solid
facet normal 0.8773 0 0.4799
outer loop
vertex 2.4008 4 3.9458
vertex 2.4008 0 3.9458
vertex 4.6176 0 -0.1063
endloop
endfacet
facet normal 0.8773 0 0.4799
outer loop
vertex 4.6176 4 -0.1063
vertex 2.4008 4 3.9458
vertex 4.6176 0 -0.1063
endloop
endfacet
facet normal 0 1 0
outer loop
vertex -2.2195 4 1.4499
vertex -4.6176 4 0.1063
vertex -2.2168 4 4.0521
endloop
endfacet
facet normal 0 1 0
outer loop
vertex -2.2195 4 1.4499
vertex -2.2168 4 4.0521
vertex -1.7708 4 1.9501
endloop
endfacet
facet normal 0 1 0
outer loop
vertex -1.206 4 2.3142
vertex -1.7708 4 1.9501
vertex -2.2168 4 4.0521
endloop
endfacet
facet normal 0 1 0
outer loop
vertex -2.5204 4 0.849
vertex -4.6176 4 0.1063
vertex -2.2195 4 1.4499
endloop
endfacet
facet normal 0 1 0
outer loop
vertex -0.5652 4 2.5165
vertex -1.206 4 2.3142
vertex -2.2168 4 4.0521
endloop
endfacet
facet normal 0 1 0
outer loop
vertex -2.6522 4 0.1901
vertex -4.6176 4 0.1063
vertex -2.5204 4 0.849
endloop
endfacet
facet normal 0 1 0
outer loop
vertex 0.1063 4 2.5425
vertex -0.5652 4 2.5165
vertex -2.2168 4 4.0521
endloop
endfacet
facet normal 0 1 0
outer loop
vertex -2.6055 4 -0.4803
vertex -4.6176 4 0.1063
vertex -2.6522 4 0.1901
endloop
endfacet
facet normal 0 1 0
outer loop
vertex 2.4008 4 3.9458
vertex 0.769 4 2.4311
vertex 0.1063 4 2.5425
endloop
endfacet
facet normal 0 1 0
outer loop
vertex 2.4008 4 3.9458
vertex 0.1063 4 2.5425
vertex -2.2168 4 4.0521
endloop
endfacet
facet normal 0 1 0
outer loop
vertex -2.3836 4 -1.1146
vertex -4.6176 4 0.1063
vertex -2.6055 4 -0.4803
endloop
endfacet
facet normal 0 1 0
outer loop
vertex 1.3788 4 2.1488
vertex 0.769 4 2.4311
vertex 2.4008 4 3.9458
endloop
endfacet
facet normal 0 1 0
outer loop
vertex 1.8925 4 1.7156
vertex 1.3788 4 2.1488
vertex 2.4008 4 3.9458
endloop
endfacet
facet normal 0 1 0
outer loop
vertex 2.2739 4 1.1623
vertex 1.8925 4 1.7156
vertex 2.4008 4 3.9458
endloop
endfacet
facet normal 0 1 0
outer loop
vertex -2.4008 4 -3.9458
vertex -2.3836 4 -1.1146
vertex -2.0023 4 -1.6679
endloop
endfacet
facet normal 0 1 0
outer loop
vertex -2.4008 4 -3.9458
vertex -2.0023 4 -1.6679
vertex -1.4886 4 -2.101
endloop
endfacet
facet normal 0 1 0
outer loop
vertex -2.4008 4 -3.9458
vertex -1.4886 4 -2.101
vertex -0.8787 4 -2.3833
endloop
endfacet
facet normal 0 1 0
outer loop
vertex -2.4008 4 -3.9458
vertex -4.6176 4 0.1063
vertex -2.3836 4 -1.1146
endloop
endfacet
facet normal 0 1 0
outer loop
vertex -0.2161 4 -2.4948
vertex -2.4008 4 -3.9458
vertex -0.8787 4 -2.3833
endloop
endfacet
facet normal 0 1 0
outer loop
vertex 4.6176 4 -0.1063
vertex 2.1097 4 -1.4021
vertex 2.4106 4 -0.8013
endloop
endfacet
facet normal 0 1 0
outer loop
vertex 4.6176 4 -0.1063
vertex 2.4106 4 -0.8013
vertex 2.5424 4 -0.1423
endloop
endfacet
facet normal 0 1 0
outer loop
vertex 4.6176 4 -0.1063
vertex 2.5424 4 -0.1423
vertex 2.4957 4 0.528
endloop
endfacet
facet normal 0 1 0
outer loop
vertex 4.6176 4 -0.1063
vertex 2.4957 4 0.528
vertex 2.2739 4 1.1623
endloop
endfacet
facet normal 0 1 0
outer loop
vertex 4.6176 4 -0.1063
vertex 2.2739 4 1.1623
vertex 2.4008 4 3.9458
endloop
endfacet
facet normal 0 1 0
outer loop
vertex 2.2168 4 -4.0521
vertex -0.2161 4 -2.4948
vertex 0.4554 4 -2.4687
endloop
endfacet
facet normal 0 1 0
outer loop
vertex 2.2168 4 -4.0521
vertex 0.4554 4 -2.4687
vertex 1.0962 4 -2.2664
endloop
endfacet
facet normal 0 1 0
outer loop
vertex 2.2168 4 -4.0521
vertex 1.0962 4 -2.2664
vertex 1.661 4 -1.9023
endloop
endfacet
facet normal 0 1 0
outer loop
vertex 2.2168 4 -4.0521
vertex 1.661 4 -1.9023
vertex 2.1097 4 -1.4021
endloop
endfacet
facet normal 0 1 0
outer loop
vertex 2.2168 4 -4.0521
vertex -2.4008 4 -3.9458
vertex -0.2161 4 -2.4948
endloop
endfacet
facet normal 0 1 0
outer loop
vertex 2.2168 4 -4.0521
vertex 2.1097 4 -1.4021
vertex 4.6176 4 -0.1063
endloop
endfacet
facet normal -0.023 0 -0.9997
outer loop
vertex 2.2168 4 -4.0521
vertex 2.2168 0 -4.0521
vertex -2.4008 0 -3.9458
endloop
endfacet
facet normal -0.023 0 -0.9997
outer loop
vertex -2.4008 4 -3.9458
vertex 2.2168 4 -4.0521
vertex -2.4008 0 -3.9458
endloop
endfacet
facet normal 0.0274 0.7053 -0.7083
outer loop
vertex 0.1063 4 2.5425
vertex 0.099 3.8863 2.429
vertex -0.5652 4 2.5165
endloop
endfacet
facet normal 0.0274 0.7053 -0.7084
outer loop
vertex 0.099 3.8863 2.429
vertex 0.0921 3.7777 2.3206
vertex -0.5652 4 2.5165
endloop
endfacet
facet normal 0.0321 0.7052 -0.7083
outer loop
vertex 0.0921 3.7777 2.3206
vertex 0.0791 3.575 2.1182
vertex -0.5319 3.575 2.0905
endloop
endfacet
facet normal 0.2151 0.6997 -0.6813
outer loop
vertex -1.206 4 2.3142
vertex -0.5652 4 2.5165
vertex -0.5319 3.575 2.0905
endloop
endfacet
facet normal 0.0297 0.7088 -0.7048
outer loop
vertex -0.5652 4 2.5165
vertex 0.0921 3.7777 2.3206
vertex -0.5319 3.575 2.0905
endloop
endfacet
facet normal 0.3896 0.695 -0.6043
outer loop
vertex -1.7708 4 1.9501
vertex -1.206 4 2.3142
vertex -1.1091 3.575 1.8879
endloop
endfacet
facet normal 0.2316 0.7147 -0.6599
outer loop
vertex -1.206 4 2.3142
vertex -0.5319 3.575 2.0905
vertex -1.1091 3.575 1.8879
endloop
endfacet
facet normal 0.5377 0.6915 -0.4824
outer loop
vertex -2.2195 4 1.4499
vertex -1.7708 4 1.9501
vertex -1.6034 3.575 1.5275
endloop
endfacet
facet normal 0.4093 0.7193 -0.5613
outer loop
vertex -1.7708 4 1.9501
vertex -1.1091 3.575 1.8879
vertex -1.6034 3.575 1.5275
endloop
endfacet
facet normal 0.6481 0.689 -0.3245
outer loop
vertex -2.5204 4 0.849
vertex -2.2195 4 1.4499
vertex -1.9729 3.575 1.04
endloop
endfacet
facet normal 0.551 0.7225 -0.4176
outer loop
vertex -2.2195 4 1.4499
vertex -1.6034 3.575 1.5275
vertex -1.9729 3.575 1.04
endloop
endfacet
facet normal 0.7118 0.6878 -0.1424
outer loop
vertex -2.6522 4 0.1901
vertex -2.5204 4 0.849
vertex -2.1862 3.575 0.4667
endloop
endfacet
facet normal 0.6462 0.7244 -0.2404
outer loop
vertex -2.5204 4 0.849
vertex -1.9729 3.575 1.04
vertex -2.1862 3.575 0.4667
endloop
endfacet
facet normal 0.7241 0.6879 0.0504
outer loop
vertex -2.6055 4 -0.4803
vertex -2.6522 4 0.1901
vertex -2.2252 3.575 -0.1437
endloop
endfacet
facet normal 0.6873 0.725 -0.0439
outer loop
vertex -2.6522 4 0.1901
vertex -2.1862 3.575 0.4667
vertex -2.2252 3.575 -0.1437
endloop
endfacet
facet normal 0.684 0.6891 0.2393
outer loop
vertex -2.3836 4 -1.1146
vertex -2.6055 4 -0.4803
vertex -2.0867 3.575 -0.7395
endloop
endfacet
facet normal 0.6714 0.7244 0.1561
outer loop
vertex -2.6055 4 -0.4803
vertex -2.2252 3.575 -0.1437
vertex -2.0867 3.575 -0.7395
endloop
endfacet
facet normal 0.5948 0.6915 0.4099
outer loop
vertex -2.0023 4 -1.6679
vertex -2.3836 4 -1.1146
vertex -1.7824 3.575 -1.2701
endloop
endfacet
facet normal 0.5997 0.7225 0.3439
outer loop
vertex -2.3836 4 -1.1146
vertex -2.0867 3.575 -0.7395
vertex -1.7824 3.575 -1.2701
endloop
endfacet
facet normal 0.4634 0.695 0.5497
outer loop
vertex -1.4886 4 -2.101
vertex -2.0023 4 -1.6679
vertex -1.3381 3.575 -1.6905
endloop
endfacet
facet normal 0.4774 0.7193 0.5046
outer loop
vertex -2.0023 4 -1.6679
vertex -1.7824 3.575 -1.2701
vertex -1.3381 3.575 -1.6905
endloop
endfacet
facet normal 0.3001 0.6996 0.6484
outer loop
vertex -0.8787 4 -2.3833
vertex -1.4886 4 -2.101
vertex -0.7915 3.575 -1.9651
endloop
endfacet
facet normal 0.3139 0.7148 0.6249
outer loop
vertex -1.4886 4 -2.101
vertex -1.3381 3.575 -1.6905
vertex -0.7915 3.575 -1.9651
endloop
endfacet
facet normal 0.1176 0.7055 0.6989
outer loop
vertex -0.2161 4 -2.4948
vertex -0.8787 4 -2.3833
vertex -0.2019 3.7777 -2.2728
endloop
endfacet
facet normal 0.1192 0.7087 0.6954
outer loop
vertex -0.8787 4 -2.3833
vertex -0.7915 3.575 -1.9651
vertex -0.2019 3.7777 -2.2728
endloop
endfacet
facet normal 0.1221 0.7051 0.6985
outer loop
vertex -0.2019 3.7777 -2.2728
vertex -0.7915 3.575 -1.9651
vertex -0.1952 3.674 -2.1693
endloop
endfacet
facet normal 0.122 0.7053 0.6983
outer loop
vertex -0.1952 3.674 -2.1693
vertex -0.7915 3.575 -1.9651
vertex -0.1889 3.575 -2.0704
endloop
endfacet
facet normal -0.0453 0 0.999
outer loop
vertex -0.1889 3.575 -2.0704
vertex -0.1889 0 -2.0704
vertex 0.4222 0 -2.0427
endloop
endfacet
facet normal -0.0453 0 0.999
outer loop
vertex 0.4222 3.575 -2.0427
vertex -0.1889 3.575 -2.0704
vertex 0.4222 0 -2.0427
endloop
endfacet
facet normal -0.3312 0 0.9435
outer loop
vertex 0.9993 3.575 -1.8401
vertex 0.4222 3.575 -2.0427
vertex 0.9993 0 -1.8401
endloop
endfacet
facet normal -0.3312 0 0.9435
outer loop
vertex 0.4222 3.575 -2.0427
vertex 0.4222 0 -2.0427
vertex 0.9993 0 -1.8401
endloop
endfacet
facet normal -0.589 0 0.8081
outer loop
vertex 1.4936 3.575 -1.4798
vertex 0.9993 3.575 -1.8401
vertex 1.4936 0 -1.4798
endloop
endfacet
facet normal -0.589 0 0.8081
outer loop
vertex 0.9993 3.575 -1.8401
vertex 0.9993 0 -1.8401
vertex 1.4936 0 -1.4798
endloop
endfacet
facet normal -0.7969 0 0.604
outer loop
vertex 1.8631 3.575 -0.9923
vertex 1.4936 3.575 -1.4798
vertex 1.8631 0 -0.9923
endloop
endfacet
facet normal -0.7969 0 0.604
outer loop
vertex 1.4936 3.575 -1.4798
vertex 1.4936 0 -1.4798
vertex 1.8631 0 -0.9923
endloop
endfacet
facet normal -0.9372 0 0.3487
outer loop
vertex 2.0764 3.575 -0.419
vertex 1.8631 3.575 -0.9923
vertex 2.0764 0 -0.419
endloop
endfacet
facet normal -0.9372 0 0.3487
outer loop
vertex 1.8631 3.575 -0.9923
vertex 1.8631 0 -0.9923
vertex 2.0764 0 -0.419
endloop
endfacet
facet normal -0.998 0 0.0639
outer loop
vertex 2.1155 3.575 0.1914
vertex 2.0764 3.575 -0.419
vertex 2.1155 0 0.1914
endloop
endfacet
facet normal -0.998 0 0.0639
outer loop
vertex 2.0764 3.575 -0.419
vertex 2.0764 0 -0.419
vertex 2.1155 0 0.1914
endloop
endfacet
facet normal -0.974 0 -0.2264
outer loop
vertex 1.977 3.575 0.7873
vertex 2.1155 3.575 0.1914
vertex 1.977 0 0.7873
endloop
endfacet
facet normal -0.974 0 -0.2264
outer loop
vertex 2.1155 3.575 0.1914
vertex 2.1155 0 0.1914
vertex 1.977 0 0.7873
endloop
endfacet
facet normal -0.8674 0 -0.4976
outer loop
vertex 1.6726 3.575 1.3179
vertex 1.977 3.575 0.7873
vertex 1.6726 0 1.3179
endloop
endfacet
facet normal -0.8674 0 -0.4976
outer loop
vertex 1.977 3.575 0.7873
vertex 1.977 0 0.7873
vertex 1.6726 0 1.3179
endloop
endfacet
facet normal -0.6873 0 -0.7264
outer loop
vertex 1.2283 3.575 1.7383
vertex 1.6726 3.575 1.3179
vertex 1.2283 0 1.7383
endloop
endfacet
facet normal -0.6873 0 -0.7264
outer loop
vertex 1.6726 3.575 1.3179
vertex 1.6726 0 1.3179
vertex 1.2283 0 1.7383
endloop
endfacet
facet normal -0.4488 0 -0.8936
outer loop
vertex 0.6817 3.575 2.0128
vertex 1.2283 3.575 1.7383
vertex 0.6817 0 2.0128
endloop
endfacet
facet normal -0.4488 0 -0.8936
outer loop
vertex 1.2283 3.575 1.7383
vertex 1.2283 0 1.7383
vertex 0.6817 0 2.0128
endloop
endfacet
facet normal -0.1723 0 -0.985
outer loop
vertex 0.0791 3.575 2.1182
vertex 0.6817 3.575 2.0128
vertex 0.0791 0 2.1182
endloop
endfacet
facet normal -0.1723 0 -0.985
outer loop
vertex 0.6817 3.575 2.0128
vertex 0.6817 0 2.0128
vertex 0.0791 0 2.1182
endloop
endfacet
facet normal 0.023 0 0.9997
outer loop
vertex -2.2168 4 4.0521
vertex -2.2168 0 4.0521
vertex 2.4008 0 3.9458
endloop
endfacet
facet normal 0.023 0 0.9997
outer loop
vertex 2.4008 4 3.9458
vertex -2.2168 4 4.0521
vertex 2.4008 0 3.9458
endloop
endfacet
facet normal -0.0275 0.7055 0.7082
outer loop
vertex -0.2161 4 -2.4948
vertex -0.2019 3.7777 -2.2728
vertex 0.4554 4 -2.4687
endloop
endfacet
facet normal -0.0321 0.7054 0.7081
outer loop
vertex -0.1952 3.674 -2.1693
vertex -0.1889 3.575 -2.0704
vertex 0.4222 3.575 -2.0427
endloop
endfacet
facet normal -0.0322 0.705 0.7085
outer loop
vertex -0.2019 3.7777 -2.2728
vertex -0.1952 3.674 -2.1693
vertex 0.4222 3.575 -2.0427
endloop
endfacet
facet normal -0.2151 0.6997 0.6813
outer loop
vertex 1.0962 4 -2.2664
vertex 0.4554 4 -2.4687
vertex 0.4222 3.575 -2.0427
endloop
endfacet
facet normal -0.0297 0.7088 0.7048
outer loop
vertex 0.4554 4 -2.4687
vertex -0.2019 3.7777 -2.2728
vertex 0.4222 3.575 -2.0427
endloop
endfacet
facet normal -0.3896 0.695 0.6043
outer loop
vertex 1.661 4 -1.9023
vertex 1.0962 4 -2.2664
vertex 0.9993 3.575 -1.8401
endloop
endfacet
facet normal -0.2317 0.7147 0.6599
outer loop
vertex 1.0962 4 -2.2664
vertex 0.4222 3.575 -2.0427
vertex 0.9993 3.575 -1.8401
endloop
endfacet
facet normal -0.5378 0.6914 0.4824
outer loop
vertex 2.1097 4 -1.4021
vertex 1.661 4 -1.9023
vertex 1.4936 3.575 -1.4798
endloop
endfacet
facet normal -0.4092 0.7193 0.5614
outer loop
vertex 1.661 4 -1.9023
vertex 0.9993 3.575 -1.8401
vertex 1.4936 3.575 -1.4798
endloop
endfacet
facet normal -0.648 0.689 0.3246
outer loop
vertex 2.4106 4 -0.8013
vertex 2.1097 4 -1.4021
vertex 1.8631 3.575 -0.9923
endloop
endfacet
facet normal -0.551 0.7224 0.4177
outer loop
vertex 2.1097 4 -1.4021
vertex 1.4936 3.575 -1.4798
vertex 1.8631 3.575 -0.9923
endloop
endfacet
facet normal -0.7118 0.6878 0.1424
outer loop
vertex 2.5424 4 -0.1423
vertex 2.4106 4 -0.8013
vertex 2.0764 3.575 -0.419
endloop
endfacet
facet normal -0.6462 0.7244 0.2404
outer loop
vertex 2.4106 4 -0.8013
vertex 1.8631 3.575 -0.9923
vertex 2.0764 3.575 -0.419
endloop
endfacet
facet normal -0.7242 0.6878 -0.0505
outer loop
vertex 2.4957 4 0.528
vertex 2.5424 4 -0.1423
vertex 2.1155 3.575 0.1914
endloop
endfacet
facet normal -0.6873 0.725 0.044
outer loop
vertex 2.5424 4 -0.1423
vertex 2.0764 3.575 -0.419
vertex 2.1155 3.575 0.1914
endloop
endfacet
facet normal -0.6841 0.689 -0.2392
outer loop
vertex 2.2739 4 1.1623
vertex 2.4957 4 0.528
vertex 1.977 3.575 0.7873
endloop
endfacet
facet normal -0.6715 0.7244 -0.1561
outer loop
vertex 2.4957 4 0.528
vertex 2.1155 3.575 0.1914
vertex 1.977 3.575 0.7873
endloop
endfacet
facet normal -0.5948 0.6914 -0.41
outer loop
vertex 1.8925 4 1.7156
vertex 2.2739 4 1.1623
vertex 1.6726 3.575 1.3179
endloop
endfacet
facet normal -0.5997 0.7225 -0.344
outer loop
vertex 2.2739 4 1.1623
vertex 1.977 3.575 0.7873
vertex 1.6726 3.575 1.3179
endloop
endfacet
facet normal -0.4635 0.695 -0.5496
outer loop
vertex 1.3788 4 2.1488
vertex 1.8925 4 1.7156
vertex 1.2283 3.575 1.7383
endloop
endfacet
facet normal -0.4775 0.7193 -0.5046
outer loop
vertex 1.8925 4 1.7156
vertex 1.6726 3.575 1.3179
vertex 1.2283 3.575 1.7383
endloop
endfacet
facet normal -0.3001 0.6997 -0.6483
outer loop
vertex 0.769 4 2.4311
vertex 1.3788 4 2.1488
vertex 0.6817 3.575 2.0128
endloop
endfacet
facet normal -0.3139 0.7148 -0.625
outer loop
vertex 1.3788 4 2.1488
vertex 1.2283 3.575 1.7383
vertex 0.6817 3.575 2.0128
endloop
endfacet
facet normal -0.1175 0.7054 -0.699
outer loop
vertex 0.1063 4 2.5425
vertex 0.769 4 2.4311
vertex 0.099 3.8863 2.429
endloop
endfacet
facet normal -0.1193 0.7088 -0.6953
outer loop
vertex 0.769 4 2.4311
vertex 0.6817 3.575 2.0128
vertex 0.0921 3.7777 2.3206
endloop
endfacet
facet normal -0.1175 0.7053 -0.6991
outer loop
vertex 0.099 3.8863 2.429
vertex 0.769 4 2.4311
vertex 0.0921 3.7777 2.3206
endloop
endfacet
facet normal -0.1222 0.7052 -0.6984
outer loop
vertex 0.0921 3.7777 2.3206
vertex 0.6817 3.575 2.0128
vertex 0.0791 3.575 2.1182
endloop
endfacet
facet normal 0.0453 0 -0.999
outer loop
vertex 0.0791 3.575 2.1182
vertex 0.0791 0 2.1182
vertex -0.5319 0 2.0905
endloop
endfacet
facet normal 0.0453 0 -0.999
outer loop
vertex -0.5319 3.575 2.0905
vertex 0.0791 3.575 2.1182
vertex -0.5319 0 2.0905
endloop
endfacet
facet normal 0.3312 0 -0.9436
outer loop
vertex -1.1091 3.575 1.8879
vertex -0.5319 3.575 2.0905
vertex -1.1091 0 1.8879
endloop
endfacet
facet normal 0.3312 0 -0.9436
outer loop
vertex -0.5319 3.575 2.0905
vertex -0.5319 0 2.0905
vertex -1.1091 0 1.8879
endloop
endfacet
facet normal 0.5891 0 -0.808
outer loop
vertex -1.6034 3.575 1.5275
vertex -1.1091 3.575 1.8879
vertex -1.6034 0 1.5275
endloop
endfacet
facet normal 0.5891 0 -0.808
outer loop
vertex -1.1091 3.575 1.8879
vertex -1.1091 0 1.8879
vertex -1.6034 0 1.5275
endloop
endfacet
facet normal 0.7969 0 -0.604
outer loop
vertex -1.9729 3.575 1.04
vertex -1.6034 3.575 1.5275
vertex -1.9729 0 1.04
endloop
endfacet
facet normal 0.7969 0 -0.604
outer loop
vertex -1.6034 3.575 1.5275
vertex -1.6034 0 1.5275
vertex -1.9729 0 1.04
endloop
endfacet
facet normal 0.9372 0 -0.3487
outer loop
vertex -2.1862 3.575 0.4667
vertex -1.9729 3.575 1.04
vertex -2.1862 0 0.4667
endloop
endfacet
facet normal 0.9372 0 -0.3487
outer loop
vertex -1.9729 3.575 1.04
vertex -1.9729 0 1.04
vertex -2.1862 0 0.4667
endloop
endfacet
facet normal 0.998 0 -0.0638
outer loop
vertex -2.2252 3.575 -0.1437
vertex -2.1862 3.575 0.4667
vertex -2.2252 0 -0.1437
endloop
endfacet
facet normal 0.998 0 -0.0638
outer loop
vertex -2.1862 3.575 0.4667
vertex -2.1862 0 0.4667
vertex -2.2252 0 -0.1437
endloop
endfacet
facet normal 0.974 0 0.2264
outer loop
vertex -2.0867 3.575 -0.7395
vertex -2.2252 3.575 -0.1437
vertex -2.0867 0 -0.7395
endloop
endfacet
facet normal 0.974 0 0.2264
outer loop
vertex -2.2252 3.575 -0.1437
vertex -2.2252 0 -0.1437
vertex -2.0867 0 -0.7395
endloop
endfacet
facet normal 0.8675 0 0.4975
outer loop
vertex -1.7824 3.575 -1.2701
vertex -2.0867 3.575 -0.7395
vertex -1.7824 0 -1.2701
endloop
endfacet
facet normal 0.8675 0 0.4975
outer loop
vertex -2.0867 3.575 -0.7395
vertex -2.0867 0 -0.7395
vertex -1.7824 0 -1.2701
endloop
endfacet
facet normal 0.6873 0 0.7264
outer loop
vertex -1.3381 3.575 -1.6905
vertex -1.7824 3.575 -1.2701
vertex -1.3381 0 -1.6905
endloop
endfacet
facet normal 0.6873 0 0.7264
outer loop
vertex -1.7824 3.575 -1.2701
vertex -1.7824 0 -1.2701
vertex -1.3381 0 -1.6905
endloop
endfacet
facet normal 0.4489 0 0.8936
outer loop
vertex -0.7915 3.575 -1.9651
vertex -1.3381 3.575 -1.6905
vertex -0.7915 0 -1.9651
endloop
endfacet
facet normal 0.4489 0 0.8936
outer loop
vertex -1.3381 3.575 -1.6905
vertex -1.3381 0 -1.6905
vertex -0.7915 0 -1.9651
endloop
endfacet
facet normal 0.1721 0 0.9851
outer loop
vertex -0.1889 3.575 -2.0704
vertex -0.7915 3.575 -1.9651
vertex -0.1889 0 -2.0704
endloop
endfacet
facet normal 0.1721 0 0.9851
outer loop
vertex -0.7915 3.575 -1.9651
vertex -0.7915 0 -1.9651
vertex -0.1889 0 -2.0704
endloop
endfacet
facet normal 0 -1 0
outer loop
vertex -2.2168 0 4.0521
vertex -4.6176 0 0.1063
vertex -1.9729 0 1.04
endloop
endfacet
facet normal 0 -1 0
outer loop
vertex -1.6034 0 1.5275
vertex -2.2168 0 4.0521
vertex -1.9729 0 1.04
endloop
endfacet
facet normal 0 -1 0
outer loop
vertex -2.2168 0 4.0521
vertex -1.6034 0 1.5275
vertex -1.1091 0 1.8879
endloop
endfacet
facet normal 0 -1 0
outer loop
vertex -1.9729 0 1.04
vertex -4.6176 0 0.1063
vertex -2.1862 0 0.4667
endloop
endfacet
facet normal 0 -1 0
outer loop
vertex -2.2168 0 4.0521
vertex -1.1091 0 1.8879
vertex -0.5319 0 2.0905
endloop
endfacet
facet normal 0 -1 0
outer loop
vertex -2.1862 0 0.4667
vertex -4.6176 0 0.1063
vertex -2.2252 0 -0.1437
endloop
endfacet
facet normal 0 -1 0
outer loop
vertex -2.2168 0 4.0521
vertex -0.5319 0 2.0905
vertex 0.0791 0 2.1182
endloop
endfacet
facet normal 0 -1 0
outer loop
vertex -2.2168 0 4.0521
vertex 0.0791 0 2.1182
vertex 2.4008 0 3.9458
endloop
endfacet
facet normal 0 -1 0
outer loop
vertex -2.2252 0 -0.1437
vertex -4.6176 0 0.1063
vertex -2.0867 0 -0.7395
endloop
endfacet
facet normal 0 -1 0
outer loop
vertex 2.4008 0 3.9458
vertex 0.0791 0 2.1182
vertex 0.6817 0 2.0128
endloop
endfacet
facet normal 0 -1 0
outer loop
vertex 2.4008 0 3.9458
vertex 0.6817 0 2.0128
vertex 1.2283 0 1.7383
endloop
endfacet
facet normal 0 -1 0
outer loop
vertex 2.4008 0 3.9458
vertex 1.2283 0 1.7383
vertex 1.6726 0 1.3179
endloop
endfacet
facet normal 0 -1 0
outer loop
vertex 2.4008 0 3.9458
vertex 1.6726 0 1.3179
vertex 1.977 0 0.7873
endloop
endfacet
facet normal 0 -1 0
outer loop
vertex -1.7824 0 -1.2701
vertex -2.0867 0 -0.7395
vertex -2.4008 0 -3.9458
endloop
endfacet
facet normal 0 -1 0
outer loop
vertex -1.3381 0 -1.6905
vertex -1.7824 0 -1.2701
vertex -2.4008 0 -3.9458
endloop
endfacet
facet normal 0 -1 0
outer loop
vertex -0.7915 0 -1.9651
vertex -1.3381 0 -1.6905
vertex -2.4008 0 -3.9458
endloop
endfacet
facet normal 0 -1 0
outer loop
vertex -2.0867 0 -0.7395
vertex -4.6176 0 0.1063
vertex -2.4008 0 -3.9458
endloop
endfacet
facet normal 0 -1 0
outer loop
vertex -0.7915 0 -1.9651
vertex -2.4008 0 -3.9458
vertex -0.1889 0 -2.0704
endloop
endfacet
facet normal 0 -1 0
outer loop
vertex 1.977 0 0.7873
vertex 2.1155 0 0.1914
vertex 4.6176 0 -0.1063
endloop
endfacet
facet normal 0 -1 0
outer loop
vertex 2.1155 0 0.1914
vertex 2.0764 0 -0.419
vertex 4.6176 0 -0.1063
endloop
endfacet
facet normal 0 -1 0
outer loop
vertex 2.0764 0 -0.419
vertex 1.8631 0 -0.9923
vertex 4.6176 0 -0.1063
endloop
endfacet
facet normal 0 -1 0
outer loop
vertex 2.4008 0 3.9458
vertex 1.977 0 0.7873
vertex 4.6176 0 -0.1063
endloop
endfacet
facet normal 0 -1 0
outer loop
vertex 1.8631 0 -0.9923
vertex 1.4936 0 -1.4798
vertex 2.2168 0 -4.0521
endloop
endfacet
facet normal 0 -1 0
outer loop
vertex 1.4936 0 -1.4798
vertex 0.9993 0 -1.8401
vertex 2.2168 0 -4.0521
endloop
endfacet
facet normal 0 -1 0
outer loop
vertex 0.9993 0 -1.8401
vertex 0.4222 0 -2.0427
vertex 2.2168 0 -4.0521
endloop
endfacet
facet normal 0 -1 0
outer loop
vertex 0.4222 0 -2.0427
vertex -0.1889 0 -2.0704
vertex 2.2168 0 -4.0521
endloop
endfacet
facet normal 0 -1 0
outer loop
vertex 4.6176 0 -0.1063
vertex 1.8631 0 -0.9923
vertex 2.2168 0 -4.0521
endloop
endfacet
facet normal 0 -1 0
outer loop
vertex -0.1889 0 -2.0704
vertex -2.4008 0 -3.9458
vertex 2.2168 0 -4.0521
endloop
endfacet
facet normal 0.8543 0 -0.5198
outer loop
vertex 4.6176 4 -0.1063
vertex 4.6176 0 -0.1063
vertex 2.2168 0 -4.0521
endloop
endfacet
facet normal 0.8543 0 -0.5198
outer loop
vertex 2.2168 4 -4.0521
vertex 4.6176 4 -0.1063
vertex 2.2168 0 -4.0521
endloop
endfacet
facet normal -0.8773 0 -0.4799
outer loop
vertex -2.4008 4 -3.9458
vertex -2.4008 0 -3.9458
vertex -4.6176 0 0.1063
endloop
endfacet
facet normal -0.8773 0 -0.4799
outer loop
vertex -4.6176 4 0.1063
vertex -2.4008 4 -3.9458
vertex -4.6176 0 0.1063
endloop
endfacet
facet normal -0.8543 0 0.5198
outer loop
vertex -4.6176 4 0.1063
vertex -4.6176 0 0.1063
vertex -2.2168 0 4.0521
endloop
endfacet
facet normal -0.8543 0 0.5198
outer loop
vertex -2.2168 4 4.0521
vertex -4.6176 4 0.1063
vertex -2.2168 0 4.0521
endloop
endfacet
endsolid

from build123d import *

# Parameters (mm, degrees)
BOSS_EXTRUDE2_DEPTH         = 4
M5_TAPPED_HOLE3_D           = 4.2
M5_TAPPED_HOLE3_CSINK_D     = 5.05
M5_TAPPED_HOLE3_CSINK_ANGLE = 90


with BuildPart() as part:
    # Sketch8 → Boss-Extrude2 (new body)
    with BuildSketch(Plane(origin=(0, 0, 0), x_dir=(1, 0, 0), z_dir=(0, 1, 0))):
        Polygon((2.400826816, -3.945803332), (4.617579332, 0.106275347), (2.216752516, 4.052078679), (-2.400826816, 3.945803332), (-4.617579332, -0.106275347), (-2.216752516, -4.052078679), align=None)
    extrude(amount=BOSS_EXTRUDE2_DEPTH)

    # M5 Tapped Hole3 (through all)
    with Locations(Plane(origin=(-0.132343684, 4, 0.02883036), x_dir=(0, 0, 1), z_dir=(0, 1, 0))):
        with Locations((0, 0), (-0.009914208, 0.154917862)):
            CounterSinkHole(M5_TAPPED_HOLE3_D / 2, M5_TAPPED_HOLE3_CSINK_D / 2, counter_sink_angle=M5_TAPPED_HOLE3_CSINK_ANGLE)


solid = part.part
